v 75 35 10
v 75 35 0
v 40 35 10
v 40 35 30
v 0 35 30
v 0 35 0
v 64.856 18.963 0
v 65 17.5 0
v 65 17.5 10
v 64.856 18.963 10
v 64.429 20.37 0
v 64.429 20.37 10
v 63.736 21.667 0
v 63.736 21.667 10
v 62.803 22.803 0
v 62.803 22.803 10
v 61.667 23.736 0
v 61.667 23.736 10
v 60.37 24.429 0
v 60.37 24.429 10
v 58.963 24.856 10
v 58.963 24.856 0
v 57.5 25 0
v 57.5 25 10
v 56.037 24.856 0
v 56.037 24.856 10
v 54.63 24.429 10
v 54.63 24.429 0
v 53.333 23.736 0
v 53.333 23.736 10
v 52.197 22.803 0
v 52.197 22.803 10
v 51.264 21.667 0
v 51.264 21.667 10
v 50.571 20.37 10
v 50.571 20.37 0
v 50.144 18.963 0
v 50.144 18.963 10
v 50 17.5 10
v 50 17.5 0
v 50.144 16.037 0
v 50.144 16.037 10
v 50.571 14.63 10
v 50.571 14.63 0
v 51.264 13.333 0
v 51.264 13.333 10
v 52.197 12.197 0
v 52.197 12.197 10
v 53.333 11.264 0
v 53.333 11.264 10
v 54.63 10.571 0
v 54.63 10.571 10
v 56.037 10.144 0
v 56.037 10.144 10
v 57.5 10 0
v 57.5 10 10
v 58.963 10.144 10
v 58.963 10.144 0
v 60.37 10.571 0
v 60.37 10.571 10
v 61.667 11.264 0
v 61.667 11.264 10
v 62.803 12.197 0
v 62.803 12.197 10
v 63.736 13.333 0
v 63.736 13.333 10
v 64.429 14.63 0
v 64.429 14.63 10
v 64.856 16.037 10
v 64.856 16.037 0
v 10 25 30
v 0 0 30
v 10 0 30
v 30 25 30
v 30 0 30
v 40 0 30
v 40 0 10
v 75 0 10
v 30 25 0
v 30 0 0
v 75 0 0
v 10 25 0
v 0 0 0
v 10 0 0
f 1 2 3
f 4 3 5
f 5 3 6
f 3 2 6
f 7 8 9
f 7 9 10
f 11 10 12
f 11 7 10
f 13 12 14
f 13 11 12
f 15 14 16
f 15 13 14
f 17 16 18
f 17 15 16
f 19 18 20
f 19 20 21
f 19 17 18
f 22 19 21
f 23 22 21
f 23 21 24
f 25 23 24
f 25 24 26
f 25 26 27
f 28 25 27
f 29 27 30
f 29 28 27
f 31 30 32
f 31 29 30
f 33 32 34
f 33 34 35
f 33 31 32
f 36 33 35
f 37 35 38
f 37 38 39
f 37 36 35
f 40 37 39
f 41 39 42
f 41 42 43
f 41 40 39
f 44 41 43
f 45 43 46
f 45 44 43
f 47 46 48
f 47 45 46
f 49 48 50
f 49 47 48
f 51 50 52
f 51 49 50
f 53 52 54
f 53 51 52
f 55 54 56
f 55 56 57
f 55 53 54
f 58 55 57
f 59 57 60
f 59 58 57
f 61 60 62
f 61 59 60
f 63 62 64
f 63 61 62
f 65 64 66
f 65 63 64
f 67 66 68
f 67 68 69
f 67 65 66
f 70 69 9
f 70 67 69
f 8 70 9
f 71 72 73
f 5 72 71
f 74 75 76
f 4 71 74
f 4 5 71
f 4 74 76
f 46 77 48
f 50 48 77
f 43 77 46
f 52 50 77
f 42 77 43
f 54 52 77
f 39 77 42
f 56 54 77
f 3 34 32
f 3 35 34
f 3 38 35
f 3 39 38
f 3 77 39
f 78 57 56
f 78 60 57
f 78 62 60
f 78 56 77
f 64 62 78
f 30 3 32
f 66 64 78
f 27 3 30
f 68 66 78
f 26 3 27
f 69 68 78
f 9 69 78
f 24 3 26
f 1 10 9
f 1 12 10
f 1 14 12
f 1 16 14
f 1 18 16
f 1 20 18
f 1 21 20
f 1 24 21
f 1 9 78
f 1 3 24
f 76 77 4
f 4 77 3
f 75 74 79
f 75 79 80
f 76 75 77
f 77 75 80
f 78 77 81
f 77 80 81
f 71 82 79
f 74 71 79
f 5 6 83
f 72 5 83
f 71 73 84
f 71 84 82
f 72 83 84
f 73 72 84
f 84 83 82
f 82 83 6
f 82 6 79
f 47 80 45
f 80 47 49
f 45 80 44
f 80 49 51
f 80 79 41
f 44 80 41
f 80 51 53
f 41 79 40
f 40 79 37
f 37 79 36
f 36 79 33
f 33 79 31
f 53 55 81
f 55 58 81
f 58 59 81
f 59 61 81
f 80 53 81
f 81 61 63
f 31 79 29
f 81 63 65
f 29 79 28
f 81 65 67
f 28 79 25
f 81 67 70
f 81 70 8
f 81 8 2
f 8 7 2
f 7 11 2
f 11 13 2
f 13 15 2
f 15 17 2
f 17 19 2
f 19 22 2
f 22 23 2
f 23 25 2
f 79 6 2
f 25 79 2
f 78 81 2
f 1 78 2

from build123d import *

# Parameters (mm, degrees)
BOSS_EXTRUDE1_DEPTH = 30
SKETCH1_3_W         = 35
SKETCH1_3_H         = 35
SKETCH1_3_R         = 7.5
BOSS_EXTRUDE2_DEPTH = 10


with BuildPart() as part:
    # Sketch1 → Boss-Extrude1 (new body)
    with BuildSketch(Plane.XY):
        Polygon((10, 0), (10, 25), (30, 25), (30, 0), (40, 0), (40, 35), (0, 35), (0, 0), align=None)
    extrude(amount=BOSS_EXTRUDE1_DEPTH)

    # Sketch1<3> → Boss-Extrude2 (add)
    with BuildSketch(Plane.XY):
        with Locations((57.5, 17.5)):
            Rectangle(SKETCH1_3_W, SKETCH1_3_H)
        with Locations((57.5, 17.5)):
            Circle(SKETCH1_3_R, mode=Mode.SUBTRACT)
    extrude(amount=BOSS_EXTRUDE2_DEPTH)


solid = part.part
